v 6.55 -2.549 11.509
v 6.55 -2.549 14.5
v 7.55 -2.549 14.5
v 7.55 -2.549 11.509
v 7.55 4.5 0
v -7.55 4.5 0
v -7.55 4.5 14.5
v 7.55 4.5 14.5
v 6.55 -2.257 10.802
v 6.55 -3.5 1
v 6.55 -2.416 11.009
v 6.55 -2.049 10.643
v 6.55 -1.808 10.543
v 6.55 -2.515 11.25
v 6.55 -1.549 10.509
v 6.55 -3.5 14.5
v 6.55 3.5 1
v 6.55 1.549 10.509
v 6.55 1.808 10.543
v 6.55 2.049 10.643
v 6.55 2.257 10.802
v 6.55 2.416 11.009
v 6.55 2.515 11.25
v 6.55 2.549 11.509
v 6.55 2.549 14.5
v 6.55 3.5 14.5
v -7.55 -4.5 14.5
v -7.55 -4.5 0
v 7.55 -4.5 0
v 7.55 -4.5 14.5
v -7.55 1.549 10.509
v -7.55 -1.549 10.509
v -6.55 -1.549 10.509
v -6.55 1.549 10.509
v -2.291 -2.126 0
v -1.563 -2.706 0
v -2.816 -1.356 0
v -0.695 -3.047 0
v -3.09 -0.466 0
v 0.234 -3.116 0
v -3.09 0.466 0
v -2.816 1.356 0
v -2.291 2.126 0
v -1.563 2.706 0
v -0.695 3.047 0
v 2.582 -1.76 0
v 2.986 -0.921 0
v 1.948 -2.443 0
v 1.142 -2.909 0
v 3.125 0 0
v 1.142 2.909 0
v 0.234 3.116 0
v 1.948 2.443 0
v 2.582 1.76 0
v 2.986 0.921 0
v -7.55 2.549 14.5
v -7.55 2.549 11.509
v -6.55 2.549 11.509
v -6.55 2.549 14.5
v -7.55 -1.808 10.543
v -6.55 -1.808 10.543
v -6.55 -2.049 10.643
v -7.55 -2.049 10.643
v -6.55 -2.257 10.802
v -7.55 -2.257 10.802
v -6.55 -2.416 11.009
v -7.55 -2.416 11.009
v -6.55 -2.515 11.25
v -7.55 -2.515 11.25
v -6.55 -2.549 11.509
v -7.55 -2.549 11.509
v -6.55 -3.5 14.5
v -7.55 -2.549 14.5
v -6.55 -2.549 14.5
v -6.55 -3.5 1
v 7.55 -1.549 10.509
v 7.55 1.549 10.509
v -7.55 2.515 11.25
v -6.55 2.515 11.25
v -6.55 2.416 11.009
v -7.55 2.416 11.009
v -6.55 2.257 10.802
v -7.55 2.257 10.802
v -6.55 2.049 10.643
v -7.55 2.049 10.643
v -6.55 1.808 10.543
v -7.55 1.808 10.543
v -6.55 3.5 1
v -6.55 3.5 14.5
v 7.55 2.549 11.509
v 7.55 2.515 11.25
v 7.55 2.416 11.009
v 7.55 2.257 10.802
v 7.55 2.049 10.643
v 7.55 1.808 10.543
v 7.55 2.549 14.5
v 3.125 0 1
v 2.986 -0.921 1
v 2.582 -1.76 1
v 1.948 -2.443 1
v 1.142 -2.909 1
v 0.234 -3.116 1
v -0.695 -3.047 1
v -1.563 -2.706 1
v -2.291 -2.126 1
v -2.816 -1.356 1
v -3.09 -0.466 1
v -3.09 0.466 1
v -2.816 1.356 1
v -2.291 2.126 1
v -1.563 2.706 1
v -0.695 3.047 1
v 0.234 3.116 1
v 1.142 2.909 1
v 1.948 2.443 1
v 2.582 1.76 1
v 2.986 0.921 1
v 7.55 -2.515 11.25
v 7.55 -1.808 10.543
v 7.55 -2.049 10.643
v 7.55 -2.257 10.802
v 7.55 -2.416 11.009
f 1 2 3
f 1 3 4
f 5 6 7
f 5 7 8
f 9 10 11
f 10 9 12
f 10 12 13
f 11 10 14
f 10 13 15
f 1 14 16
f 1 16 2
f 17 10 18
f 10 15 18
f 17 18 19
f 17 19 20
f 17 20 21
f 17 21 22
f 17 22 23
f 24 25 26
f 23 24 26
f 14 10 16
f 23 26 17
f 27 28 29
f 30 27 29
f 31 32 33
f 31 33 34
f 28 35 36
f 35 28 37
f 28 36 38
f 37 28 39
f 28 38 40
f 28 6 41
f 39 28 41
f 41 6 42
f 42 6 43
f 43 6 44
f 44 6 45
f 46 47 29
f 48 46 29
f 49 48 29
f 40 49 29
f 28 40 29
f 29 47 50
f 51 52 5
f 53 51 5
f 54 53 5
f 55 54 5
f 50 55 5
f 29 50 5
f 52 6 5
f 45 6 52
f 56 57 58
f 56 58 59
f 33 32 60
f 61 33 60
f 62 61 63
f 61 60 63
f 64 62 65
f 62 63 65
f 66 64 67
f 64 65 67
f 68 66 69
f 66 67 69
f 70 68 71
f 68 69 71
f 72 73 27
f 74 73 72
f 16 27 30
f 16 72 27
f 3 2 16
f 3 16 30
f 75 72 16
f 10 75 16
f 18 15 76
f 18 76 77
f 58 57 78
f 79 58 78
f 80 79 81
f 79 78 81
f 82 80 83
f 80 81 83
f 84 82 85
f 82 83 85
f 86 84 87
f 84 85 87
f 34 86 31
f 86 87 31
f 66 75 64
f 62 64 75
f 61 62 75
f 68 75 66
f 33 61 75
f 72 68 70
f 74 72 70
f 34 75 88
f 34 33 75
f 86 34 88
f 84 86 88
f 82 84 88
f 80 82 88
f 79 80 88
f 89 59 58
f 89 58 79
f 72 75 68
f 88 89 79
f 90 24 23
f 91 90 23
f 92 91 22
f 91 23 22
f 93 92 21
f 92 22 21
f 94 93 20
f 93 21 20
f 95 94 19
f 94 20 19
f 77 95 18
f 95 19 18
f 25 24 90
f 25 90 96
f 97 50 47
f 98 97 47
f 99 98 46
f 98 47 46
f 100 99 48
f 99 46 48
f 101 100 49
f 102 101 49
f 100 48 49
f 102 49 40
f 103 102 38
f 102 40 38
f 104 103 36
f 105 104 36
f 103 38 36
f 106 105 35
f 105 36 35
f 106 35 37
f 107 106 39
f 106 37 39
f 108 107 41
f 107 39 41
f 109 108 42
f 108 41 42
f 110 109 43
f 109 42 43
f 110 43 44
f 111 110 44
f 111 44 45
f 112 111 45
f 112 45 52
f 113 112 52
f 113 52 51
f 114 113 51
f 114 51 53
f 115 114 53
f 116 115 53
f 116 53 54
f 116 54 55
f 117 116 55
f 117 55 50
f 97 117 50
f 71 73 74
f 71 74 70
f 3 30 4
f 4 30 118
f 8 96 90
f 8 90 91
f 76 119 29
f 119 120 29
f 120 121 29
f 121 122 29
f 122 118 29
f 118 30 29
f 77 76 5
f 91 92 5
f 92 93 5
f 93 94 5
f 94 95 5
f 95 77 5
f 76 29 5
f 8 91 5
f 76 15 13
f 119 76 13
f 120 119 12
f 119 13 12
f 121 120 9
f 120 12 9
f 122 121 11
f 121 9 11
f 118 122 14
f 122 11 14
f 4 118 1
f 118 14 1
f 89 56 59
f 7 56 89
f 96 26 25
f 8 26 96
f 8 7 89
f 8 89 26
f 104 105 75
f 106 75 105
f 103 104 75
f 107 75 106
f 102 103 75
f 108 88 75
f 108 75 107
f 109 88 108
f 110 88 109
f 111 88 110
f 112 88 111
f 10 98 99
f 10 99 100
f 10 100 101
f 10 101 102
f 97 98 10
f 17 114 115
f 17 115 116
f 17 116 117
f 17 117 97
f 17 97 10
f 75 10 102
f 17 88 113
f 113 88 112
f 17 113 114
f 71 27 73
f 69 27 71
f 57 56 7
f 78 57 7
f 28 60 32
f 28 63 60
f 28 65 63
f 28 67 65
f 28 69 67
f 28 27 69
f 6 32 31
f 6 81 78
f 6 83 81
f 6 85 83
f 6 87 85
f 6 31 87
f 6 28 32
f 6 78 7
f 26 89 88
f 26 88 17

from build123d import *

# Parameters (mm, degrees)
SKETCH_W        = 15.1
SKETCH_H        = 9
PAD_DEPTH       = 14.5
SKETCH001_W     = 13.1
SKETCH001_H     = 7
POCKET_DEPTH    = 13.5
SKETCH002_R     = 3.125
POCKET001_DEPTH = 5
POCKET002_DEPTH = 15.101


with BuildPart() as part:
    # Sketch → Pad (new body)
    with BuildSketch(Plane.XY):
        Rectangle(SKETCH_W, SKETCH_H)
    extrude(amount=PAD_DEPTH)

    # Sketch001 (on Face6 of Pad) → Pocket (cut)
    with BuildSketch(Plane.XY.offset(14.5)):
        Rectangle(SKETCH001_W, SKETCH001_H)
    extrude(amount=-POCKET_DEPTH, mode=Mode.SUBTRACT)

    # Sketch002 (on Face4 of Pocket) → Pocket001 (cut)
    with BuildSketch(Plane(origin=(0, 0, 0), x_dir=(1, 0, 0), z_dir=(0, 0, -1))):
        Circle(SKETCH002_R)
    extrude(amount=-POCKET001_DEPTH, mode=Mode.SUBTRACT)

    # Sketch003 (on Face2 of Pocket001) → Pocket002 (cut, through all)
    with BuildSketch(Plane(origin=(-7.55, 0, 0), x_dir=(0, -1, 0), z_dir=(-1, 0, 0))):
        with BuildLine():
            Line((-2.549494, 14.5), (2.549494, 14.5))
            Line((2.549494, 14.5), (2.549494, 11.50906))
            ThreePointArc((1.549494, 10.50906), (2.256601, 10.801953), (2.549494, 11.50906))
            Line((1.549494, 10.50906), (-1.549494, 10.50906))
            ThreePointArc((-2.549494, 11.50906), (-2.256601, 10.801953), (-1.549494, 10.50906))
            Line((-2.549494, 11.50906), (-2.549494, 14.5))
        make_face()
    extrude(amount=-POCKET002_DEPTH, mode=Mode.SUBTRACT)


solid = part.part
